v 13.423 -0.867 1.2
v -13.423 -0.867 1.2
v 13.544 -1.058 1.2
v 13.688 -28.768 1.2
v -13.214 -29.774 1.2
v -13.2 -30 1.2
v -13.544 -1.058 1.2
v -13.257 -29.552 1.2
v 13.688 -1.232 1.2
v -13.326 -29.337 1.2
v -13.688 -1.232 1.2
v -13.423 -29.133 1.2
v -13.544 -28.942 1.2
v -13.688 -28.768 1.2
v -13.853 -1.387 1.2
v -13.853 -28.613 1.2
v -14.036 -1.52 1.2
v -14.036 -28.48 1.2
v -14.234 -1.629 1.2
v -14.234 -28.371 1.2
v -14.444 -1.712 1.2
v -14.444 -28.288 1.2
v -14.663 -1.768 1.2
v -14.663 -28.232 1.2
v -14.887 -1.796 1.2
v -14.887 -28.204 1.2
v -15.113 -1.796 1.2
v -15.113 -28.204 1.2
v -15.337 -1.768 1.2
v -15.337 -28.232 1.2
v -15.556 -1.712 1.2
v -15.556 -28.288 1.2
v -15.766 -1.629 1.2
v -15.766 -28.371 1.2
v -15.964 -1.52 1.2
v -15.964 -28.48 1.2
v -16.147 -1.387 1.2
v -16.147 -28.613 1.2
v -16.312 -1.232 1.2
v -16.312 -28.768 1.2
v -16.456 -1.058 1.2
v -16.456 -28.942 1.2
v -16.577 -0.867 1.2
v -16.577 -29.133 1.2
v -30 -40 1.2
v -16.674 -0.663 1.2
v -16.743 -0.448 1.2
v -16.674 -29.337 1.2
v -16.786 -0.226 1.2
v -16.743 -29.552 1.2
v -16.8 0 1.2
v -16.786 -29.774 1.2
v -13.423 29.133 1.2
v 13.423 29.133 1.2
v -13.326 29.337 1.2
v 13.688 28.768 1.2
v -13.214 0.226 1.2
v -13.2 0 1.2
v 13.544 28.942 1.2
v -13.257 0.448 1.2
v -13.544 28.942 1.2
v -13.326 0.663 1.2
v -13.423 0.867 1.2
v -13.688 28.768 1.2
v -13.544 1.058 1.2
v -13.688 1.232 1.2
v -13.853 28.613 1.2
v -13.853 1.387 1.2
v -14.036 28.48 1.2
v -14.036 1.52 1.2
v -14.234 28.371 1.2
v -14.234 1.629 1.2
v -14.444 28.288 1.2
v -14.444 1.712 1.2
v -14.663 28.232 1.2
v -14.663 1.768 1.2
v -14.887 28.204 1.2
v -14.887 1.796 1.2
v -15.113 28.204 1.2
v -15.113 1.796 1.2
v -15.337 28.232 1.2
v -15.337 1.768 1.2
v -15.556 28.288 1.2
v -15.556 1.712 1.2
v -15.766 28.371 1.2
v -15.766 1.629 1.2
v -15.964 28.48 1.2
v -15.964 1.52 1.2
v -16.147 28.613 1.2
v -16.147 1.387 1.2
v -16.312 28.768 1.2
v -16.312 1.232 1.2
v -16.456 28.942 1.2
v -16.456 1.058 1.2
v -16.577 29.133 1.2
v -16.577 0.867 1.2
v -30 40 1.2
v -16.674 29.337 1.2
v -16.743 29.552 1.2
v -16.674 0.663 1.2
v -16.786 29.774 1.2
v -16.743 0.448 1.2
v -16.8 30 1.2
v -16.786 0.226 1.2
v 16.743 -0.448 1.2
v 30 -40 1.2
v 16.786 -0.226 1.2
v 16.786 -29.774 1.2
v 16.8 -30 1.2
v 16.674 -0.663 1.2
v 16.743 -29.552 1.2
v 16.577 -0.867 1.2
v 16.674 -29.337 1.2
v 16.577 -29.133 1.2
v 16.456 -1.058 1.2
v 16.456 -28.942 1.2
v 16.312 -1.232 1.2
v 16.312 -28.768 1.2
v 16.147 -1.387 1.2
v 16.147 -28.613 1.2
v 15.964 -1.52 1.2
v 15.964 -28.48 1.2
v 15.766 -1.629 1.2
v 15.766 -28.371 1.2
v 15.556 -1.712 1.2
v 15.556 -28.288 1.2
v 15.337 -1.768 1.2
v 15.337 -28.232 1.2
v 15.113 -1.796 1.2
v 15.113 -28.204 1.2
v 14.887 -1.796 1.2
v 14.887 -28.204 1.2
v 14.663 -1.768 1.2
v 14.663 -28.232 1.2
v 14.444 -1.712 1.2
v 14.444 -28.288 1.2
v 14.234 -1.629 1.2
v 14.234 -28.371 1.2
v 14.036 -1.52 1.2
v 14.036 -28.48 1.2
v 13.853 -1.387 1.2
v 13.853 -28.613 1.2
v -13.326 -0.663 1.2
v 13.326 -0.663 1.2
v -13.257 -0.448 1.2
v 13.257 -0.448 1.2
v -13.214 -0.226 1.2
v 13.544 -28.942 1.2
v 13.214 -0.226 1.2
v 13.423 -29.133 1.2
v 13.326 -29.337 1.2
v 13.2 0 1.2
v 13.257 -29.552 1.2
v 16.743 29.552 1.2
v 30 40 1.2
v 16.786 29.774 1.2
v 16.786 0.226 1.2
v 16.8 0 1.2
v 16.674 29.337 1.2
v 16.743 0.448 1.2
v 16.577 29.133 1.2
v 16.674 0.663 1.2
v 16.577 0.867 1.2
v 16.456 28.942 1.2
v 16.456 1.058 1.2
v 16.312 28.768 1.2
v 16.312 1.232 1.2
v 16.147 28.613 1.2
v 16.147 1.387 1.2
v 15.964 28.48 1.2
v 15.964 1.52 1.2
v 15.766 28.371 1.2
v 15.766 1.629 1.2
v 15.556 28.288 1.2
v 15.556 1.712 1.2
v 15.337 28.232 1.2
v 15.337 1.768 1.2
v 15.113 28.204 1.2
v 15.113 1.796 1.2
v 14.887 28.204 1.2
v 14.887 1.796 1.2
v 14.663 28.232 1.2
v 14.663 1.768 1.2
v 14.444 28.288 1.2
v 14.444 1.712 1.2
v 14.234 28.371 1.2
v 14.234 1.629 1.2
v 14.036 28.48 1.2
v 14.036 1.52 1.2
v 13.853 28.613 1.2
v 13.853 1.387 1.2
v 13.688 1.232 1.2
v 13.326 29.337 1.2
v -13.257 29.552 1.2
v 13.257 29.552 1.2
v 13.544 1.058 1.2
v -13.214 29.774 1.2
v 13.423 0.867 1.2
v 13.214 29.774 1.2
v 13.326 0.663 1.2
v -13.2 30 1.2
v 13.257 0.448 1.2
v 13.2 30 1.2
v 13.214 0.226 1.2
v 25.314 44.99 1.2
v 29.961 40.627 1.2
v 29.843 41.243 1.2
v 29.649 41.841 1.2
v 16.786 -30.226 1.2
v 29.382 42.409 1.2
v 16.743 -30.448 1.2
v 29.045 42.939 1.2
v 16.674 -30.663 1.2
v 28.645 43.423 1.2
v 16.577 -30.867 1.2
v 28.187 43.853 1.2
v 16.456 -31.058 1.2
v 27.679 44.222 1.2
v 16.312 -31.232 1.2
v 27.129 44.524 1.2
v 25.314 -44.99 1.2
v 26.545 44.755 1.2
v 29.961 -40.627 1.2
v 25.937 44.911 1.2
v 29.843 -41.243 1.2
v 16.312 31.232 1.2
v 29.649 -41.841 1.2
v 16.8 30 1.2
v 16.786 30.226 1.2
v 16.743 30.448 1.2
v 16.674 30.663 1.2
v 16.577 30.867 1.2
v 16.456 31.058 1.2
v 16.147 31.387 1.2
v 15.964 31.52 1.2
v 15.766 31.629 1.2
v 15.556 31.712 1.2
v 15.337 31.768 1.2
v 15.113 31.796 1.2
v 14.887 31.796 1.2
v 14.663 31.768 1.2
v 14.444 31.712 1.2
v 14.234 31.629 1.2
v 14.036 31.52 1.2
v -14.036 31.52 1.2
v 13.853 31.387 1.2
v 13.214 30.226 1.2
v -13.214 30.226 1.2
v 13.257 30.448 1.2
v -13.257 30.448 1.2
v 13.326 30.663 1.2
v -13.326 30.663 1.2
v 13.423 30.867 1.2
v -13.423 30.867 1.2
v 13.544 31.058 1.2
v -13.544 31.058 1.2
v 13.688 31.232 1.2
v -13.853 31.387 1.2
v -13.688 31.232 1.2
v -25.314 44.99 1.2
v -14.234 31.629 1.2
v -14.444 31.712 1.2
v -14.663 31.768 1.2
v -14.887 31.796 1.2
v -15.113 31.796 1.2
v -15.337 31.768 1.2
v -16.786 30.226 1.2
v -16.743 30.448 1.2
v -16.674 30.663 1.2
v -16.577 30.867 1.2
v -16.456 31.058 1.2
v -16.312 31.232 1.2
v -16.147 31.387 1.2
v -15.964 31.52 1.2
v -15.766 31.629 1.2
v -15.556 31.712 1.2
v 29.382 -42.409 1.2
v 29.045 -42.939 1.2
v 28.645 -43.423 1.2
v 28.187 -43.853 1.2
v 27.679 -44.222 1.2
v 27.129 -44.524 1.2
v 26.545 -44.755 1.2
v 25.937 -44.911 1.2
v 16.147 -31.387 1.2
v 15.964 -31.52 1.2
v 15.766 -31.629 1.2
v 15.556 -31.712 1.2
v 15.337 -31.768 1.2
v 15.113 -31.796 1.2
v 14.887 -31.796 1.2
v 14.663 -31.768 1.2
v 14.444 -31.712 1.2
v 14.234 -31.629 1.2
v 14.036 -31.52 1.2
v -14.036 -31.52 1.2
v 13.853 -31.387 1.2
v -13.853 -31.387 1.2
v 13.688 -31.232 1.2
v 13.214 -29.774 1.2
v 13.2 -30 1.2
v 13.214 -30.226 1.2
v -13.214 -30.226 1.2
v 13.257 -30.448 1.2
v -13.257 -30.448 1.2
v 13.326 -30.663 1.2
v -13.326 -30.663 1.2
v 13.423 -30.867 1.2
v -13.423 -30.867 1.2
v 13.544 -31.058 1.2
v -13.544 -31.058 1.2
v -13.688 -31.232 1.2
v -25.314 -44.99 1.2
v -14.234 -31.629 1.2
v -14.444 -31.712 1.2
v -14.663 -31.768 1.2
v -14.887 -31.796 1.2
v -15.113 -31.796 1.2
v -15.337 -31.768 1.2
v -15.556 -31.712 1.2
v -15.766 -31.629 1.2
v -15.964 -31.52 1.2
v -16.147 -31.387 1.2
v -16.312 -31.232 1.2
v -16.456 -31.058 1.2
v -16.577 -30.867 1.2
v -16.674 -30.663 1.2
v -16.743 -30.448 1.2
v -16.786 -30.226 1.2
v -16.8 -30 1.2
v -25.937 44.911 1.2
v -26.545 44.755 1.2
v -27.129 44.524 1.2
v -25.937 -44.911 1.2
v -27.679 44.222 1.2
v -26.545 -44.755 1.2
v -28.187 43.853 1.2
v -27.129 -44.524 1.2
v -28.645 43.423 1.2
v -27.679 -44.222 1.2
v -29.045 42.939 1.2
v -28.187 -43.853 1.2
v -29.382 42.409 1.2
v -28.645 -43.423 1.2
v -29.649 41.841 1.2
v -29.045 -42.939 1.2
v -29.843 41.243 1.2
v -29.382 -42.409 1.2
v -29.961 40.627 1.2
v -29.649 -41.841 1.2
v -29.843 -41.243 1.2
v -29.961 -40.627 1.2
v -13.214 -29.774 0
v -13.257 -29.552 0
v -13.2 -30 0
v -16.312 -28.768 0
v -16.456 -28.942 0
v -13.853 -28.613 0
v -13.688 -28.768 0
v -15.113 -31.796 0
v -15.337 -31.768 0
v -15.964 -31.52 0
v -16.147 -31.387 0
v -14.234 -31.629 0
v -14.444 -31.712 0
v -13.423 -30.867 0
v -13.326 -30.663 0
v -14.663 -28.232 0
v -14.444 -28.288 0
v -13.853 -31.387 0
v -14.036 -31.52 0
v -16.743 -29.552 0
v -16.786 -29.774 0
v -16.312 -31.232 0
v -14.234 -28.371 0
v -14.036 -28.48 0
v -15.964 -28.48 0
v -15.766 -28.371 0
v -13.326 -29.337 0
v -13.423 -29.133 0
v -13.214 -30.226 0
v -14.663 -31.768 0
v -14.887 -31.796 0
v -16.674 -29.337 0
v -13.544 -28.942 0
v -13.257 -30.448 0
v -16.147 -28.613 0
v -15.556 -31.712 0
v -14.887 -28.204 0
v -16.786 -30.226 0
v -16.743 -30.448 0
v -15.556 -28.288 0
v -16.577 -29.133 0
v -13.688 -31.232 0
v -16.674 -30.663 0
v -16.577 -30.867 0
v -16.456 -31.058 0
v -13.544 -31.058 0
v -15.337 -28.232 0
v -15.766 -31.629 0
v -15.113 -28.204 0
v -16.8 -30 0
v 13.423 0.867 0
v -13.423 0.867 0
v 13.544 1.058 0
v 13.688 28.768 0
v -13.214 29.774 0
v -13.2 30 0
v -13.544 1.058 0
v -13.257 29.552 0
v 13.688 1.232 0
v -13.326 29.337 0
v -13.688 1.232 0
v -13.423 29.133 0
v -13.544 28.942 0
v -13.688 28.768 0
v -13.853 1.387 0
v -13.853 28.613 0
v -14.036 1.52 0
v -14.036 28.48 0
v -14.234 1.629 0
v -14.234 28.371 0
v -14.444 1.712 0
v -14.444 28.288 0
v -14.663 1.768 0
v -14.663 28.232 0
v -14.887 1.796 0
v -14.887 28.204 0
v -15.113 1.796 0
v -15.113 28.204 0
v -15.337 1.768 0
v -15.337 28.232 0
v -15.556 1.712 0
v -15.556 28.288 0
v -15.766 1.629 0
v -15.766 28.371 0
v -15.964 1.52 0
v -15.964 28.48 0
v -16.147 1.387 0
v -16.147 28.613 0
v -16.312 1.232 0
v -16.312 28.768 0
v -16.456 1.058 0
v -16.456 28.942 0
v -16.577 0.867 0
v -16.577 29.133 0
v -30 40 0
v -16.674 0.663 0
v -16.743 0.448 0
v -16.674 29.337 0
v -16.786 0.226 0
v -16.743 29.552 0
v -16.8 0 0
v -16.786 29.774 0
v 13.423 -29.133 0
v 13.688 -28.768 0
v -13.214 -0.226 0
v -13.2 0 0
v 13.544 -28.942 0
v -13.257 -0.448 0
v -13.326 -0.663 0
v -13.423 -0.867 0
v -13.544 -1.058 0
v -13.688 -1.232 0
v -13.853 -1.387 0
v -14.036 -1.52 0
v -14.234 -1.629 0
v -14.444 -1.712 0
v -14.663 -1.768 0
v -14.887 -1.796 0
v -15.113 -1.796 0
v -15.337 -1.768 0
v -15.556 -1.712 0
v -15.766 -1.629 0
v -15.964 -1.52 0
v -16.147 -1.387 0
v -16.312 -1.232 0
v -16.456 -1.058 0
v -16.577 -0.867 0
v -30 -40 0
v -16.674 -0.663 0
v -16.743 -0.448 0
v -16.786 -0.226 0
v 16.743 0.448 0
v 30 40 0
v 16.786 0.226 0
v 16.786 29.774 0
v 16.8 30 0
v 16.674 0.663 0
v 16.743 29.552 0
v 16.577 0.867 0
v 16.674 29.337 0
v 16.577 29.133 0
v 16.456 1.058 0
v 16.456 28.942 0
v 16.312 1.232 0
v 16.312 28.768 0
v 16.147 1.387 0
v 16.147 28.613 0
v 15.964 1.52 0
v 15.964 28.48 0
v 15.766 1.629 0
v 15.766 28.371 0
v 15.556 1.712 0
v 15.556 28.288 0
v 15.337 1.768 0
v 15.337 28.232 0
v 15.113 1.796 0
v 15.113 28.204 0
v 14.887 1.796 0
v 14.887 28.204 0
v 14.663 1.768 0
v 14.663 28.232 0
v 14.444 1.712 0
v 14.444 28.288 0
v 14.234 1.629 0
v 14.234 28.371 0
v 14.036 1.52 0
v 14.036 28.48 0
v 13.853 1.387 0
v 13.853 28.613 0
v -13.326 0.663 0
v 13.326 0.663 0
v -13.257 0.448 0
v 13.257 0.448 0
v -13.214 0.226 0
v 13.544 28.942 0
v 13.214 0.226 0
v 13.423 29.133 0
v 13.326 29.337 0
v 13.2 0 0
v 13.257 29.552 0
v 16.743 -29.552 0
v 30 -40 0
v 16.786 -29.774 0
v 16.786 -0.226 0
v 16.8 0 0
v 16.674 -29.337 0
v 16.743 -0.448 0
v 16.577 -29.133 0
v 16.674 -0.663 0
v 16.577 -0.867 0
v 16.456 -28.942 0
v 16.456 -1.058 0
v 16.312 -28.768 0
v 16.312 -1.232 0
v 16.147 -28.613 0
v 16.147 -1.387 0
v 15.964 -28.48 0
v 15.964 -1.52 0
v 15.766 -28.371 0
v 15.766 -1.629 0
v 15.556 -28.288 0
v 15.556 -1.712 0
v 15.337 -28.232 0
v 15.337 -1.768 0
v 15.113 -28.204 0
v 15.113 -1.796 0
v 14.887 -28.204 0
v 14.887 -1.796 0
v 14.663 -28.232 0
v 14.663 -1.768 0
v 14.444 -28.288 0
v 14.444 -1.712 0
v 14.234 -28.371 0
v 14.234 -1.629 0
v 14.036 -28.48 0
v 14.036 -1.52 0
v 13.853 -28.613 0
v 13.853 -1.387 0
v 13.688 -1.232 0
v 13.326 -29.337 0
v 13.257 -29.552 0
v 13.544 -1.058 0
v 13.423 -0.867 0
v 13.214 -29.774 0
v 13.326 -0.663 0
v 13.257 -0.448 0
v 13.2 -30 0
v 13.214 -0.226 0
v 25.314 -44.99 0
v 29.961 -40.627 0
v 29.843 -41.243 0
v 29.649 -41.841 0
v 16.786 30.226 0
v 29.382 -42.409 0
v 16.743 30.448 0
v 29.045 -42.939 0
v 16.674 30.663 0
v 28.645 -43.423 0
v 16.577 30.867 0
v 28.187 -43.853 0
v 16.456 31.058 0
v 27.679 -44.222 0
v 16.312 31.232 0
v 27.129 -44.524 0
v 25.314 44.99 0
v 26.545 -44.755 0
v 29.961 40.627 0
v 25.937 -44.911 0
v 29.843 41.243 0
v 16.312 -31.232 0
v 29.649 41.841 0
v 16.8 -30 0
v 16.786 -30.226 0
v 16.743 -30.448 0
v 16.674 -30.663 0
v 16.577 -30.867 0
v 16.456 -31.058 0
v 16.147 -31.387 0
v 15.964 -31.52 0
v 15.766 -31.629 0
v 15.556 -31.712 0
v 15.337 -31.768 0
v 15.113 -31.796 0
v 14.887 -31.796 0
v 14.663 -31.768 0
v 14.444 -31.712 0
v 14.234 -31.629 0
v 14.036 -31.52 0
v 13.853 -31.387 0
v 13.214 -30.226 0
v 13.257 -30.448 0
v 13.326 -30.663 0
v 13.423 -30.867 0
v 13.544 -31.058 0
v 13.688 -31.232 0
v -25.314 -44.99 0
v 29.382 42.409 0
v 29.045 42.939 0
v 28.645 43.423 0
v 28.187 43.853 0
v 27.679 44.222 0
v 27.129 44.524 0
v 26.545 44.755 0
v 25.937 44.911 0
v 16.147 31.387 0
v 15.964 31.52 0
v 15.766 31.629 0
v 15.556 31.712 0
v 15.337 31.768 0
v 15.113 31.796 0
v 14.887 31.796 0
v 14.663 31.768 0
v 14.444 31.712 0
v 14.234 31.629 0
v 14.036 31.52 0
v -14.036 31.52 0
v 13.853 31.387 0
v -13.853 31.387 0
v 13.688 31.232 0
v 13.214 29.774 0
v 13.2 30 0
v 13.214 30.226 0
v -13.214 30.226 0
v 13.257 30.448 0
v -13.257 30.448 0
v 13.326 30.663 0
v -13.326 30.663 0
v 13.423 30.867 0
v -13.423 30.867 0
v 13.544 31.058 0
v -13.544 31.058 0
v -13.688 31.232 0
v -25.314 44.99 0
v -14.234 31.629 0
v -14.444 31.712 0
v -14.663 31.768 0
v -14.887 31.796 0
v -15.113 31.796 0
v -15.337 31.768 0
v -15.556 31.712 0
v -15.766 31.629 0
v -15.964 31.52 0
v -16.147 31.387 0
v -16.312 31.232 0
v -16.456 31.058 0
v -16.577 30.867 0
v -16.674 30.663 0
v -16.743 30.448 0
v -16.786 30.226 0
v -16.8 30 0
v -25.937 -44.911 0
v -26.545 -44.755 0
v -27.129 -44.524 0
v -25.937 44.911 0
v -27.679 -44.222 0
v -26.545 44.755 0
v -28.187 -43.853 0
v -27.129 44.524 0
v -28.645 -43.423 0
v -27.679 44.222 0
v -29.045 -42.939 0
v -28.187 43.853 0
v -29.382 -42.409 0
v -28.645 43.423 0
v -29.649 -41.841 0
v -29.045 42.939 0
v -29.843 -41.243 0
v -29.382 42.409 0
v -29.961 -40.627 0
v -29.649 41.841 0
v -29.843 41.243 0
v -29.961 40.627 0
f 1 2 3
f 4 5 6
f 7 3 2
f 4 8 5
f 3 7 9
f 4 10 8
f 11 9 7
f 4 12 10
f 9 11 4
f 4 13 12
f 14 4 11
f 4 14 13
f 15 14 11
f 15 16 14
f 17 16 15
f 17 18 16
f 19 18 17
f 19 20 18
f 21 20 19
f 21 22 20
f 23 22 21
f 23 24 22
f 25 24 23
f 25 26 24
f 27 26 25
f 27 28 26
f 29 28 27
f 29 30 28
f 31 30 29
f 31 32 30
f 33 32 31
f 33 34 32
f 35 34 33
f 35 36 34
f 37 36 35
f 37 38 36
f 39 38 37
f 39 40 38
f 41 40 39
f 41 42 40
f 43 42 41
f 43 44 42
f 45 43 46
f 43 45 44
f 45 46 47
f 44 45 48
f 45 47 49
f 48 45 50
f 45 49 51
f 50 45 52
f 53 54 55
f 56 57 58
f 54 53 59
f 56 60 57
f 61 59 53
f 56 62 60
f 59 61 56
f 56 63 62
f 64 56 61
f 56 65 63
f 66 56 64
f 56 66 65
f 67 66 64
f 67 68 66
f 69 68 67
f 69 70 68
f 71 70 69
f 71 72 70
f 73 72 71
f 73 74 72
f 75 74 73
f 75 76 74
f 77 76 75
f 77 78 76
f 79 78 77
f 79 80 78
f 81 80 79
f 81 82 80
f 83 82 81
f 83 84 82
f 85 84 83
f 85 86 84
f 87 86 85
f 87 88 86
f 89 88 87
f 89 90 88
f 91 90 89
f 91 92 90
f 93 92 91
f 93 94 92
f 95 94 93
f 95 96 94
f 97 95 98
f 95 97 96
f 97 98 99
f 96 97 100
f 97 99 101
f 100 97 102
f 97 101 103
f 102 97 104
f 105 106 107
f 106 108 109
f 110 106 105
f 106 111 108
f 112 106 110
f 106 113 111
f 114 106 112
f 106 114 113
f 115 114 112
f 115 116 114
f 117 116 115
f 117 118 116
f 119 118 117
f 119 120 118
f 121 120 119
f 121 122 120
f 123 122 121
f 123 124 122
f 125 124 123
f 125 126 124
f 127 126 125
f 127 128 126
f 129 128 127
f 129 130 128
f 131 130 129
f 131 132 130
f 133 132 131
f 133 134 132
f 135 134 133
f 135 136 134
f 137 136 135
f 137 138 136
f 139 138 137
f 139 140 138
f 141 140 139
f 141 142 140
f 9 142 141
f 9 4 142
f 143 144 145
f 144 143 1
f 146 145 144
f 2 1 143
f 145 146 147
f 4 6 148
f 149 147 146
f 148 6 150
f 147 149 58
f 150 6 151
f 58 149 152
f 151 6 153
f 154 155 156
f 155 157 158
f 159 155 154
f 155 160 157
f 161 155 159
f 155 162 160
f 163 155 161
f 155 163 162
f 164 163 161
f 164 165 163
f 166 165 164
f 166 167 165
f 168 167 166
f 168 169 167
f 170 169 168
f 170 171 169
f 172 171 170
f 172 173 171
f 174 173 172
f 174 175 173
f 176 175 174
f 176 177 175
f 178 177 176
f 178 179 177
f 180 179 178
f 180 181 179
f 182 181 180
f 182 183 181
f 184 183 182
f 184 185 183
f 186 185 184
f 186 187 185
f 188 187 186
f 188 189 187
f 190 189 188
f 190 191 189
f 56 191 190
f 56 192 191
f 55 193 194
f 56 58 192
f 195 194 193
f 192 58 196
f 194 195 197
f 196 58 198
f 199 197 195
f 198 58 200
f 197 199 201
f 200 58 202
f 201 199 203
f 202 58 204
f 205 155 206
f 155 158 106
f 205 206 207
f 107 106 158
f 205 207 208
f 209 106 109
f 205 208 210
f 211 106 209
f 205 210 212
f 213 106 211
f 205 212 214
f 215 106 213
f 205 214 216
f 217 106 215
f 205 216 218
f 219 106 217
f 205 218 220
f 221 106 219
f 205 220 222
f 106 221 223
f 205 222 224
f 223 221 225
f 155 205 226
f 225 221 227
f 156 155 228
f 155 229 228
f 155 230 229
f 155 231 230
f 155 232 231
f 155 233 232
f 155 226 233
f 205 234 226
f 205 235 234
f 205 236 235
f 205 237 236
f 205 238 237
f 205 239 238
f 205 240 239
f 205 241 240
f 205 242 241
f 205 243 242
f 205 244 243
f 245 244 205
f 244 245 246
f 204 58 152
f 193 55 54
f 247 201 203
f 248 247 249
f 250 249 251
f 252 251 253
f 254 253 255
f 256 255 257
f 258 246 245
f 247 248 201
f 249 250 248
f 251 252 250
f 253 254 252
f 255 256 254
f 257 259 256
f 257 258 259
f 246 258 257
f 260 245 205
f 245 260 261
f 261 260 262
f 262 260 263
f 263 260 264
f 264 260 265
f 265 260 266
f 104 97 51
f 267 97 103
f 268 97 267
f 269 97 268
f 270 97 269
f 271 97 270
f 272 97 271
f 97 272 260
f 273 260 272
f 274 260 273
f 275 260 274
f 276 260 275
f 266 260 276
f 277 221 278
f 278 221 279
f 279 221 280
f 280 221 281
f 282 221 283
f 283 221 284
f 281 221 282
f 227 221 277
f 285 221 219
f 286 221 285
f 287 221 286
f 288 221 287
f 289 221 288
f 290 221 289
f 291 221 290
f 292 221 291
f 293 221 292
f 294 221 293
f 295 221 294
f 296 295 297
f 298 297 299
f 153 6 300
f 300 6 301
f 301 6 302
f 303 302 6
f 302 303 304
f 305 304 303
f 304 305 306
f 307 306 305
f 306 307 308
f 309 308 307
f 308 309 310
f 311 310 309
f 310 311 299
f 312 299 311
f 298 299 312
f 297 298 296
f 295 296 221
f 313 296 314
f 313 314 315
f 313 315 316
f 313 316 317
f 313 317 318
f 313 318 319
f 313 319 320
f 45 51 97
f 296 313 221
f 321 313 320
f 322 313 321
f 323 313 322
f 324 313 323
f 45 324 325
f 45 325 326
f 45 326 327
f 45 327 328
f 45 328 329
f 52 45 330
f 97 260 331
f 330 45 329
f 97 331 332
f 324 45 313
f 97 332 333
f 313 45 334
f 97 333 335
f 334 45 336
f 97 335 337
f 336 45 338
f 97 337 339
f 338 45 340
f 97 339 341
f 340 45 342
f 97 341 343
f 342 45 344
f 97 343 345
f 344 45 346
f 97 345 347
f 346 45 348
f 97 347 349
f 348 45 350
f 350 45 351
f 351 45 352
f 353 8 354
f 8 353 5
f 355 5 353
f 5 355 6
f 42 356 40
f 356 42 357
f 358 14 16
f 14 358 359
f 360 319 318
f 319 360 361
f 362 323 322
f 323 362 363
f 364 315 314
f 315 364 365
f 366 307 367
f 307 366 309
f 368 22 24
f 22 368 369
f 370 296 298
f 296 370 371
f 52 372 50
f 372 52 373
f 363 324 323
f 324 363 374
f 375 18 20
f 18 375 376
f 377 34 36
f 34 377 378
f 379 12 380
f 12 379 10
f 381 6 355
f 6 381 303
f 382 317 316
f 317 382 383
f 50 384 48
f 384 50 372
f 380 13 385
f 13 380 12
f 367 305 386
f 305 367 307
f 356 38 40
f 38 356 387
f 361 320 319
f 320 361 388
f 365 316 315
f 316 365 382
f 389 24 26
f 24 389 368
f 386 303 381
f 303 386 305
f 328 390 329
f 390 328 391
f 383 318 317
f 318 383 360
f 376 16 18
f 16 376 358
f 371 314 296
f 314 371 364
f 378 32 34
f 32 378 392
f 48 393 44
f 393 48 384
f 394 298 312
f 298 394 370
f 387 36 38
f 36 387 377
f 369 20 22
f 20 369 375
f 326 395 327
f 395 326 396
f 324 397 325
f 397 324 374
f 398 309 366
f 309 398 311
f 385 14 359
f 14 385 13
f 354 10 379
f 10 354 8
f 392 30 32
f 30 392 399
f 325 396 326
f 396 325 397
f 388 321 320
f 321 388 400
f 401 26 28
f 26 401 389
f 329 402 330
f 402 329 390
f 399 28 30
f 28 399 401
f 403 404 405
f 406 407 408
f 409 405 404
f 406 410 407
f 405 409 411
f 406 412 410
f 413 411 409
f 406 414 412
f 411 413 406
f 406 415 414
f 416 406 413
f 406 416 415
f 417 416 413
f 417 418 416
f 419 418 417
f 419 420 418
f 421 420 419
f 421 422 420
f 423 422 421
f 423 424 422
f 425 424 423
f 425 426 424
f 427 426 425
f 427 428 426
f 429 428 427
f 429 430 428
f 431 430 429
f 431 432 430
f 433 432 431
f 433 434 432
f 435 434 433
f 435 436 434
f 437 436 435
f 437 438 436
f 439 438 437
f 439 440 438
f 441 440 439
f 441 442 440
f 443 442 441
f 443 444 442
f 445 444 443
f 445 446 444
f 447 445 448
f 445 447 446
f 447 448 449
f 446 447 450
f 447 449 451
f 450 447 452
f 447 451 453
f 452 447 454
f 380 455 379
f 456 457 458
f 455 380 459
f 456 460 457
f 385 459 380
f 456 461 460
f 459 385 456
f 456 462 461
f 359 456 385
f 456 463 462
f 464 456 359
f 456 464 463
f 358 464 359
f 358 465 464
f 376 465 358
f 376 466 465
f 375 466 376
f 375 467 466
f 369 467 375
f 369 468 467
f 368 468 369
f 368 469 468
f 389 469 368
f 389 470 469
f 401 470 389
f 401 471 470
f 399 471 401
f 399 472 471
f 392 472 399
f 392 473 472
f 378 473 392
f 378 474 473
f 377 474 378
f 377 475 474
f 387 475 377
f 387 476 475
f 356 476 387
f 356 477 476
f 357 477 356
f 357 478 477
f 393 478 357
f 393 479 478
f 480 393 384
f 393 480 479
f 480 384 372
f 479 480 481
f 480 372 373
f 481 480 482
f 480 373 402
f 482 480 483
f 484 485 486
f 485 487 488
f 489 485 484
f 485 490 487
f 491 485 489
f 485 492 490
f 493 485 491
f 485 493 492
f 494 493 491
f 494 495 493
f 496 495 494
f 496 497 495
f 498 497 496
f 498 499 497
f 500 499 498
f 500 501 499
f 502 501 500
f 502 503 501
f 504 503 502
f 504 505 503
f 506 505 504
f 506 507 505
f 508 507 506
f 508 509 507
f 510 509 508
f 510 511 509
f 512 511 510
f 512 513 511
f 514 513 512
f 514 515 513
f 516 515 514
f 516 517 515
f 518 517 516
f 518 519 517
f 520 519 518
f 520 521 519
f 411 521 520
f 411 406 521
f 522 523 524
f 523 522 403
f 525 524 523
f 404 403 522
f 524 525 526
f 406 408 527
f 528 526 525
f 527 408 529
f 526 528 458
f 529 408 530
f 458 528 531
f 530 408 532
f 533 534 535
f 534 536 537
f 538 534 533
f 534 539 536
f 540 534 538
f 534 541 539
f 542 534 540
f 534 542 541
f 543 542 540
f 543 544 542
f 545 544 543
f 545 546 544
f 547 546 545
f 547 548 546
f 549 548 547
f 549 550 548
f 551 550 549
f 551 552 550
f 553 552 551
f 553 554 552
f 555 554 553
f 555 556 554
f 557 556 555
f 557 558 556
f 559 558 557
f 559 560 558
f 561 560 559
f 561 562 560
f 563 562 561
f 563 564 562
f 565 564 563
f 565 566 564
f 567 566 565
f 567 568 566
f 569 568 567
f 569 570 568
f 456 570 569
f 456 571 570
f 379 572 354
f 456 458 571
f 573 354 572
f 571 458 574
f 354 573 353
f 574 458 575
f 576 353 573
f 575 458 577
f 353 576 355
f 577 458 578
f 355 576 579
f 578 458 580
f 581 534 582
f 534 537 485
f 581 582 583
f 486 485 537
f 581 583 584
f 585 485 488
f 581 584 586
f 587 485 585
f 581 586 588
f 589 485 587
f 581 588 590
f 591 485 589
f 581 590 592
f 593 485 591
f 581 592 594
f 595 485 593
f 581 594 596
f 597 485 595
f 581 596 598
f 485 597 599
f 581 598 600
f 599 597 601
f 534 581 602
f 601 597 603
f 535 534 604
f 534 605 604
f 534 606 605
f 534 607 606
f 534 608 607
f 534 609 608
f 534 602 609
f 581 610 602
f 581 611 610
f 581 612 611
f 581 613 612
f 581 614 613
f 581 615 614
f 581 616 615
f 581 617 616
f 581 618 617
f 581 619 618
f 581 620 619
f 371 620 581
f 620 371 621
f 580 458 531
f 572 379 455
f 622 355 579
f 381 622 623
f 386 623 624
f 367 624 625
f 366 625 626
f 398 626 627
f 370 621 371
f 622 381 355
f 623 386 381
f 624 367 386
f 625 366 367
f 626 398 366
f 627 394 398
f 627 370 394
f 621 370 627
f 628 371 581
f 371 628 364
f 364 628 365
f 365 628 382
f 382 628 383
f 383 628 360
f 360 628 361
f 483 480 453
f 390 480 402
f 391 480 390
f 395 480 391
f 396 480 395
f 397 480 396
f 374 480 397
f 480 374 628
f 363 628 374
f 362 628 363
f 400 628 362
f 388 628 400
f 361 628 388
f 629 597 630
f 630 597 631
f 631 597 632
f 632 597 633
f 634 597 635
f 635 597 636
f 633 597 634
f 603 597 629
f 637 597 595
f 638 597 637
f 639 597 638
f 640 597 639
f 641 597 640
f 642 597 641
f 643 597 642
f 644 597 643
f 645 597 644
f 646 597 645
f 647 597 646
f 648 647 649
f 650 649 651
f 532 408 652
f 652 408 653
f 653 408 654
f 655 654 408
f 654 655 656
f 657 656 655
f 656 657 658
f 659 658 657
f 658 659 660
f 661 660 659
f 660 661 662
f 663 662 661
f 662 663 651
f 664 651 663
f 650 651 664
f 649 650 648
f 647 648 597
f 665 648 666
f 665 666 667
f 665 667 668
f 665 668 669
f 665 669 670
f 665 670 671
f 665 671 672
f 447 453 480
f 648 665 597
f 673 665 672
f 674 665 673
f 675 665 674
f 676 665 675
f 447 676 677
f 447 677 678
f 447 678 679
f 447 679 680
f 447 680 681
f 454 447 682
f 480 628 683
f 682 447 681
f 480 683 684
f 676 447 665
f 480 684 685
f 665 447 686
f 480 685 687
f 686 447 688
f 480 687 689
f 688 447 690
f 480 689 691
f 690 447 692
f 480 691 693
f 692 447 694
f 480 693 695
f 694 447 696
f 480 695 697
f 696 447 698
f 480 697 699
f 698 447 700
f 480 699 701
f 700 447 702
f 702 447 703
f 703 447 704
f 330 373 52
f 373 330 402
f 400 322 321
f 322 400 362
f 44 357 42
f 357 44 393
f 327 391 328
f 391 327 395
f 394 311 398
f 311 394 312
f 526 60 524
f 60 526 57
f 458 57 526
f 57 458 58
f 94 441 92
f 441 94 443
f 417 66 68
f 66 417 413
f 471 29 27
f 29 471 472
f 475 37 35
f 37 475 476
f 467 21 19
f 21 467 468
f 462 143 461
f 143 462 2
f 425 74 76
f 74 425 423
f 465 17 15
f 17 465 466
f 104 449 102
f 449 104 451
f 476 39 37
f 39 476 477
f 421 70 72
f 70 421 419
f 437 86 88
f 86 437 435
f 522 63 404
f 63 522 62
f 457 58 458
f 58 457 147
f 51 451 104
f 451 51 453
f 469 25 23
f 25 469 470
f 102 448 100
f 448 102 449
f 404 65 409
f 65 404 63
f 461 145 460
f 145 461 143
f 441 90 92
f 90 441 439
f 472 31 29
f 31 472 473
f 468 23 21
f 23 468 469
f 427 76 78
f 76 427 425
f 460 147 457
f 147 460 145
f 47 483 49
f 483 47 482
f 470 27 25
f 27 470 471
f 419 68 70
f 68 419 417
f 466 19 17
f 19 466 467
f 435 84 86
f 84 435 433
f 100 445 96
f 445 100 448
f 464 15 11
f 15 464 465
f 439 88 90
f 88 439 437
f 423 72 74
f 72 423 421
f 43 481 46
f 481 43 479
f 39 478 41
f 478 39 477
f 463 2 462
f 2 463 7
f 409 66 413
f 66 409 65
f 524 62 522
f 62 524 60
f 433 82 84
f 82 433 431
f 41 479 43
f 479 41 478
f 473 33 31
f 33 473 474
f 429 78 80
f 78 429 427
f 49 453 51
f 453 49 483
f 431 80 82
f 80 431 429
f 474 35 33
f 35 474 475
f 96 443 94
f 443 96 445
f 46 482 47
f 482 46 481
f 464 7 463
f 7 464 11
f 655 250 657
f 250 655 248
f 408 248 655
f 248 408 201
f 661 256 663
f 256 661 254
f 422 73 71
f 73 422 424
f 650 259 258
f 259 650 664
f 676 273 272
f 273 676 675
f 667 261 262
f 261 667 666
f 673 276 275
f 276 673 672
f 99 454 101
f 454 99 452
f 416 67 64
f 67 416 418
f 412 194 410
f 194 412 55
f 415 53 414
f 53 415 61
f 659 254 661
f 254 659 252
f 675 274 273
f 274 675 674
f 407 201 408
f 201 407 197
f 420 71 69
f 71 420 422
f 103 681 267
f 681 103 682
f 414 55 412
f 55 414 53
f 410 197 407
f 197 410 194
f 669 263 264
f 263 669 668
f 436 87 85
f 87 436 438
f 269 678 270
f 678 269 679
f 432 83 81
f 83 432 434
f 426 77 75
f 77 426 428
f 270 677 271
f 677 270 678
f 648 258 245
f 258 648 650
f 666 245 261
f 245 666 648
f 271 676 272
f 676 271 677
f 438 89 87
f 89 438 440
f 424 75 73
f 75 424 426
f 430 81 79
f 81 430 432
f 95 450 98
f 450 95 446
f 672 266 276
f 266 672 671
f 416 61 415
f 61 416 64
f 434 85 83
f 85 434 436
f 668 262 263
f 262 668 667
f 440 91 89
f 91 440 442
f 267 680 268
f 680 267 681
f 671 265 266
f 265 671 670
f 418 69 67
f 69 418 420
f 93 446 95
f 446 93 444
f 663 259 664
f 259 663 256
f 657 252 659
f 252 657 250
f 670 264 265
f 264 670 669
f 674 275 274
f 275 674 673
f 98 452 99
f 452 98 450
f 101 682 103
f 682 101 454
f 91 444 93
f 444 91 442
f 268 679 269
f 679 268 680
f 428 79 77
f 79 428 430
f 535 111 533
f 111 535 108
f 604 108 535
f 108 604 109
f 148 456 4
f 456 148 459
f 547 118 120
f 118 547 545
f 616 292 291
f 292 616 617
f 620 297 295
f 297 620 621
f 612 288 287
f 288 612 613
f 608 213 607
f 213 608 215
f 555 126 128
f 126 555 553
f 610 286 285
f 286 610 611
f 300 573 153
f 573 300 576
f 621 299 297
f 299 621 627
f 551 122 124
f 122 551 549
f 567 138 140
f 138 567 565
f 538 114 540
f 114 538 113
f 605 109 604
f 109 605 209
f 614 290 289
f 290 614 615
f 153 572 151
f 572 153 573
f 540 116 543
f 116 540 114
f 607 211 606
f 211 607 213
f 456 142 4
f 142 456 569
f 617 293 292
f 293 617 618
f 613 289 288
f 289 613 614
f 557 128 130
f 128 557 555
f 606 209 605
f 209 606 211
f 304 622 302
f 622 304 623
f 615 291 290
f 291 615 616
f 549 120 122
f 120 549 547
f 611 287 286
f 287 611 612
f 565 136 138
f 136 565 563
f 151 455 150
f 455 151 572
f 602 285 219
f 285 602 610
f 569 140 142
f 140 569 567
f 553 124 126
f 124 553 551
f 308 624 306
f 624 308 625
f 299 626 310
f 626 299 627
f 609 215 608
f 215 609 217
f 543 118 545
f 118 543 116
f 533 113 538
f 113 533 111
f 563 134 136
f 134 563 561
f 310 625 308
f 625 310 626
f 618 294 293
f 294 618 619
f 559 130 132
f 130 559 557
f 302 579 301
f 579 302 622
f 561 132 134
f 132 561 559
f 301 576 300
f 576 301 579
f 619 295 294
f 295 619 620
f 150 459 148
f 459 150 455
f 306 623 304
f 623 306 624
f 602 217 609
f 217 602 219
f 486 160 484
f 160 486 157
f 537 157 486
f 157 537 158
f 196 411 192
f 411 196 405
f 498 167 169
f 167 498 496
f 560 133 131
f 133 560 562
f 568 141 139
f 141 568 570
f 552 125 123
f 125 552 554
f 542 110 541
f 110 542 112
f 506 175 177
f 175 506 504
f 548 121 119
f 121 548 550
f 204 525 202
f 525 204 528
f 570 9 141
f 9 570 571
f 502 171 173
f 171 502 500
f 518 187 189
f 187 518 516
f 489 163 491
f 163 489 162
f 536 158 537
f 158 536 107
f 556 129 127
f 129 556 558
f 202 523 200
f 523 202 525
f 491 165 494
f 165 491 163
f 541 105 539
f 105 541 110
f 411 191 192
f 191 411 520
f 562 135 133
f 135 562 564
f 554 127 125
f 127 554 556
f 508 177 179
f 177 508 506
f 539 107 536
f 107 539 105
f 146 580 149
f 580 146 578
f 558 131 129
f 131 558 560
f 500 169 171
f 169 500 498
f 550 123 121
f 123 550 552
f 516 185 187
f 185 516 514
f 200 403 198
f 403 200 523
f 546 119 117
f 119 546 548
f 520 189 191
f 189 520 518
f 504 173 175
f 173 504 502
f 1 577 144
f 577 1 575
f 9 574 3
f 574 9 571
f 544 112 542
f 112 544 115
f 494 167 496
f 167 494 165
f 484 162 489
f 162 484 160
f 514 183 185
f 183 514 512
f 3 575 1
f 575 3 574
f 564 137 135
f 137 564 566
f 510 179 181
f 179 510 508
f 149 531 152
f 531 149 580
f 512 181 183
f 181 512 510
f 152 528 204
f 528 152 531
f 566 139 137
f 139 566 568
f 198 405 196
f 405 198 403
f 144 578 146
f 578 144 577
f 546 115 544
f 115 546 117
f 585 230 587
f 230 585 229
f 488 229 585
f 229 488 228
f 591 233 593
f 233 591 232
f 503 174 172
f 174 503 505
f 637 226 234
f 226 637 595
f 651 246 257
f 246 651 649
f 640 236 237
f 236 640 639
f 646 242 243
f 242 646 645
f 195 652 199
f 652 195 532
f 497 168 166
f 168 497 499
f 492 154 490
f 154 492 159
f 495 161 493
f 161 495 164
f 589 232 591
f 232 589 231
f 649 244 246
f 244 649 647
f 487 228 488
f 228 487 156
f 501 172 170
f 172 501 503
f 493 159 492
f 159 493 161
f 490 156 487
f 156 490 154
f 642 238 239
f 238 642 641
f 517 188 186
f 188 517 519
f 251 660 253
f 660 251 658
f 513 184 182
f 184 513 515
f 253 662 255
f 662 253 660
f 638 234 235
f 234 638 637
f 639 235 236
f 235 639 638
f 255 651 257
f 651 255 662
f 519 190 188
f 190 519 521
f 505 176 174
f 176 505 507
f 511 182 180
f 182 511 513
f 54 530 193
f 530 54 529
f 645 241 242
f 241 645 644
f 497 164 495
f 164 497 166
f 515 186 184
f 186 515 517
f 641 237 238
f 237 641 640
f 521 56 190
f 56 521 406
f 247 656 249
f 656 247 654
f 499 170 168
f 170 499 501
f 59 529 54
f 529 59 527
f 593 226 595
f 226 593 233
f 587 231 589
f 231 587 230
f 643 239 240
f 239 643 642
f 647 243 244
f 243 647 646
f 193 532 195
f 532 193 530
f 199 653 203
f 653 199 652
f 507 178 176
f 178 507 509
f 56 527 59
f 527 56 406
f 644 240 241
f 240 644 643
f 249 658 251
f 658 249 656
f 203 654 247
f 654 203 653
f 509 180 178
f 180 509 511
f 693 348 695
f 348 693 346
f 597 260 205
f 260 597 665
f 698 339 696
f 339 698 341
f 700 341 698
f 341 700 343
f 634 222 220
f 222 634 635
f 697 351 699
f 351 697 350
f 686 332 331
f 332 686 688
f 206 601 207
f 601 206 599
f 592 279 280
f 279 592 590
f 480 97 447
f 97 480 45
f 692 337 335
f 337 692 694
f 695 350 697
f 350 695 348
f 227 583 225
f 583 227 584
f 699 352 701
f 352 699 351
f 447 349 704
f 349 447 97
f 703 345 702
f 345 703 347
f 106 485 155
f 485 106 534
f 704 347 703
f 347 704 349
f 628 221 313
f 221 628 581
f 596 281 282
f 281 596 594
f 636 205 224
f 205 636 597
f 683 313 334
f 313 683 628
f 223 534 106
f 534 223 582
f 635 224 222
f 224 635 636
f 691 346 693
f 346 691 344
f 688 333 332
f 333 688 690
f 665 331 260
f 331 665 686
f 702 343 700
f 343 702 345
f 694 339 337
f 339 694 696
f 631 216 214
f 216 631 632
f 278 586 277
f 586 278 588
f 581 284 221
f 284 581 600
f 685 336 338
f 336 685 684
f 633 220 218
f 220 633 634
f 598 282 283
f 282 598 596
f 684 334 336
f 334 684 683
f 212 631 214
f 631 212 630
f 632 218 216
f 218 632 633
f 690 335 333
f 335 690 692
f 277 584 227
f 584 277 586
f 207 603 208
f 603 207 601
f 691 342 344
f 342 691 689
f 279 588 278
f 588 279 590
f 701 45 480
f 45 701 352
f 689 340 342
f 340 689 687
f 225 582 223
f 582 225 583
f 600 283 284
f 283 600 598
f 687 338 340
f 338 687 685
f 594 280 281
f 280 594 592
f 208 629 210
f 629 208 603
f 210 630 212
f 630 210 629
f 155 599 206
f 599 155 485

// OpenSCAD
$fn = 50;


difference() {
	union() {
		hull() {
			translate(v = [-25.0000000000, 40.0000000000, 0]) {
				cylinder(h = 90, r = 5);
			}
			translate(v = [25.0000000000, 40.0000000000, 0]) {
				cylinder(h = 90, r = 5);
			}
			translate(v = [-25.0000000000, -40.0000000000, 0]) {
				cylinder(h = 90, r = 5);
			}
			translate(v = [25.0000000000, -40.0000000000, 0]) {
				cylinder(h = 90, r = 5);
			}
		}
	}
	union() {
		translate(v = [0, 0, 1.2000000000]) {
			hull() {
				translate(v = [-25.0000000000, 40.0000000000, 0]) {
					cylinder(h = 88.8000000000, r = 3.8000000000);
				}
				translate(v = [25.0000000000, 40.0000000000, 0]) {
					cylinder(h = 88.8000000000, r = 3.8000000000);
				}
				translate(v = [-25.0000000000, -40.0000000000, 0]) {
					cylinder(h = 88.8000000000, r = 3.8000000000);
				}
				translate(v = [25.0000000000, -40.0000000000, 0]) {
					cylinder(h = 88.8000000000, r = 3.8000000000);
				}
			}
		}
		#translate(v = [-15.0000000000, -30.0000000000, 0]) {
			cylinder(h = 1.2000000000, r = 1.8000000000);
		}
		#translate(v = [-15.0000000000, 0.0000000000, 0]) {
			cylinder(h = 1.2000000000, r = 1.8000000000);
		}
		#translate(v = [-15.0000000000, 30.0000000000, 0]) {
			cylinder(h = 1.2000000000, r = 1.8000000000);
		}
		#translate(v = [15.0000000000, -30.0000000000, 0]) {
			cylinder(h = 1.2000000000, r = 1.8000000000);
		}
		#translate(v = [15.0000000000, 0.0000000000, 0]) {
			cylinder(h = 1.2000000000, r = 1.8000000000);
		}
		#translate(v = [15.0000000000, 30.0000000000, 0]) {
			cylinder(h = 1.2000000000, r = 1.8000000000);
		}
		translate(v = [-250.0000000000, -250.0000000000, 1.2000000000]) {
			cube(size = [500, 500, 500]);
		}
		translate(v = [-250.0000000000, -250.0000000000, 1.2000000000]) {
			cube(size = [500, 500, 500]);
		}
		translate(v = [-250.0000000000, -250.0000000000, 1.2000000000]) {
			cube(size = [500, 500, 500]);
		}
	}
}
